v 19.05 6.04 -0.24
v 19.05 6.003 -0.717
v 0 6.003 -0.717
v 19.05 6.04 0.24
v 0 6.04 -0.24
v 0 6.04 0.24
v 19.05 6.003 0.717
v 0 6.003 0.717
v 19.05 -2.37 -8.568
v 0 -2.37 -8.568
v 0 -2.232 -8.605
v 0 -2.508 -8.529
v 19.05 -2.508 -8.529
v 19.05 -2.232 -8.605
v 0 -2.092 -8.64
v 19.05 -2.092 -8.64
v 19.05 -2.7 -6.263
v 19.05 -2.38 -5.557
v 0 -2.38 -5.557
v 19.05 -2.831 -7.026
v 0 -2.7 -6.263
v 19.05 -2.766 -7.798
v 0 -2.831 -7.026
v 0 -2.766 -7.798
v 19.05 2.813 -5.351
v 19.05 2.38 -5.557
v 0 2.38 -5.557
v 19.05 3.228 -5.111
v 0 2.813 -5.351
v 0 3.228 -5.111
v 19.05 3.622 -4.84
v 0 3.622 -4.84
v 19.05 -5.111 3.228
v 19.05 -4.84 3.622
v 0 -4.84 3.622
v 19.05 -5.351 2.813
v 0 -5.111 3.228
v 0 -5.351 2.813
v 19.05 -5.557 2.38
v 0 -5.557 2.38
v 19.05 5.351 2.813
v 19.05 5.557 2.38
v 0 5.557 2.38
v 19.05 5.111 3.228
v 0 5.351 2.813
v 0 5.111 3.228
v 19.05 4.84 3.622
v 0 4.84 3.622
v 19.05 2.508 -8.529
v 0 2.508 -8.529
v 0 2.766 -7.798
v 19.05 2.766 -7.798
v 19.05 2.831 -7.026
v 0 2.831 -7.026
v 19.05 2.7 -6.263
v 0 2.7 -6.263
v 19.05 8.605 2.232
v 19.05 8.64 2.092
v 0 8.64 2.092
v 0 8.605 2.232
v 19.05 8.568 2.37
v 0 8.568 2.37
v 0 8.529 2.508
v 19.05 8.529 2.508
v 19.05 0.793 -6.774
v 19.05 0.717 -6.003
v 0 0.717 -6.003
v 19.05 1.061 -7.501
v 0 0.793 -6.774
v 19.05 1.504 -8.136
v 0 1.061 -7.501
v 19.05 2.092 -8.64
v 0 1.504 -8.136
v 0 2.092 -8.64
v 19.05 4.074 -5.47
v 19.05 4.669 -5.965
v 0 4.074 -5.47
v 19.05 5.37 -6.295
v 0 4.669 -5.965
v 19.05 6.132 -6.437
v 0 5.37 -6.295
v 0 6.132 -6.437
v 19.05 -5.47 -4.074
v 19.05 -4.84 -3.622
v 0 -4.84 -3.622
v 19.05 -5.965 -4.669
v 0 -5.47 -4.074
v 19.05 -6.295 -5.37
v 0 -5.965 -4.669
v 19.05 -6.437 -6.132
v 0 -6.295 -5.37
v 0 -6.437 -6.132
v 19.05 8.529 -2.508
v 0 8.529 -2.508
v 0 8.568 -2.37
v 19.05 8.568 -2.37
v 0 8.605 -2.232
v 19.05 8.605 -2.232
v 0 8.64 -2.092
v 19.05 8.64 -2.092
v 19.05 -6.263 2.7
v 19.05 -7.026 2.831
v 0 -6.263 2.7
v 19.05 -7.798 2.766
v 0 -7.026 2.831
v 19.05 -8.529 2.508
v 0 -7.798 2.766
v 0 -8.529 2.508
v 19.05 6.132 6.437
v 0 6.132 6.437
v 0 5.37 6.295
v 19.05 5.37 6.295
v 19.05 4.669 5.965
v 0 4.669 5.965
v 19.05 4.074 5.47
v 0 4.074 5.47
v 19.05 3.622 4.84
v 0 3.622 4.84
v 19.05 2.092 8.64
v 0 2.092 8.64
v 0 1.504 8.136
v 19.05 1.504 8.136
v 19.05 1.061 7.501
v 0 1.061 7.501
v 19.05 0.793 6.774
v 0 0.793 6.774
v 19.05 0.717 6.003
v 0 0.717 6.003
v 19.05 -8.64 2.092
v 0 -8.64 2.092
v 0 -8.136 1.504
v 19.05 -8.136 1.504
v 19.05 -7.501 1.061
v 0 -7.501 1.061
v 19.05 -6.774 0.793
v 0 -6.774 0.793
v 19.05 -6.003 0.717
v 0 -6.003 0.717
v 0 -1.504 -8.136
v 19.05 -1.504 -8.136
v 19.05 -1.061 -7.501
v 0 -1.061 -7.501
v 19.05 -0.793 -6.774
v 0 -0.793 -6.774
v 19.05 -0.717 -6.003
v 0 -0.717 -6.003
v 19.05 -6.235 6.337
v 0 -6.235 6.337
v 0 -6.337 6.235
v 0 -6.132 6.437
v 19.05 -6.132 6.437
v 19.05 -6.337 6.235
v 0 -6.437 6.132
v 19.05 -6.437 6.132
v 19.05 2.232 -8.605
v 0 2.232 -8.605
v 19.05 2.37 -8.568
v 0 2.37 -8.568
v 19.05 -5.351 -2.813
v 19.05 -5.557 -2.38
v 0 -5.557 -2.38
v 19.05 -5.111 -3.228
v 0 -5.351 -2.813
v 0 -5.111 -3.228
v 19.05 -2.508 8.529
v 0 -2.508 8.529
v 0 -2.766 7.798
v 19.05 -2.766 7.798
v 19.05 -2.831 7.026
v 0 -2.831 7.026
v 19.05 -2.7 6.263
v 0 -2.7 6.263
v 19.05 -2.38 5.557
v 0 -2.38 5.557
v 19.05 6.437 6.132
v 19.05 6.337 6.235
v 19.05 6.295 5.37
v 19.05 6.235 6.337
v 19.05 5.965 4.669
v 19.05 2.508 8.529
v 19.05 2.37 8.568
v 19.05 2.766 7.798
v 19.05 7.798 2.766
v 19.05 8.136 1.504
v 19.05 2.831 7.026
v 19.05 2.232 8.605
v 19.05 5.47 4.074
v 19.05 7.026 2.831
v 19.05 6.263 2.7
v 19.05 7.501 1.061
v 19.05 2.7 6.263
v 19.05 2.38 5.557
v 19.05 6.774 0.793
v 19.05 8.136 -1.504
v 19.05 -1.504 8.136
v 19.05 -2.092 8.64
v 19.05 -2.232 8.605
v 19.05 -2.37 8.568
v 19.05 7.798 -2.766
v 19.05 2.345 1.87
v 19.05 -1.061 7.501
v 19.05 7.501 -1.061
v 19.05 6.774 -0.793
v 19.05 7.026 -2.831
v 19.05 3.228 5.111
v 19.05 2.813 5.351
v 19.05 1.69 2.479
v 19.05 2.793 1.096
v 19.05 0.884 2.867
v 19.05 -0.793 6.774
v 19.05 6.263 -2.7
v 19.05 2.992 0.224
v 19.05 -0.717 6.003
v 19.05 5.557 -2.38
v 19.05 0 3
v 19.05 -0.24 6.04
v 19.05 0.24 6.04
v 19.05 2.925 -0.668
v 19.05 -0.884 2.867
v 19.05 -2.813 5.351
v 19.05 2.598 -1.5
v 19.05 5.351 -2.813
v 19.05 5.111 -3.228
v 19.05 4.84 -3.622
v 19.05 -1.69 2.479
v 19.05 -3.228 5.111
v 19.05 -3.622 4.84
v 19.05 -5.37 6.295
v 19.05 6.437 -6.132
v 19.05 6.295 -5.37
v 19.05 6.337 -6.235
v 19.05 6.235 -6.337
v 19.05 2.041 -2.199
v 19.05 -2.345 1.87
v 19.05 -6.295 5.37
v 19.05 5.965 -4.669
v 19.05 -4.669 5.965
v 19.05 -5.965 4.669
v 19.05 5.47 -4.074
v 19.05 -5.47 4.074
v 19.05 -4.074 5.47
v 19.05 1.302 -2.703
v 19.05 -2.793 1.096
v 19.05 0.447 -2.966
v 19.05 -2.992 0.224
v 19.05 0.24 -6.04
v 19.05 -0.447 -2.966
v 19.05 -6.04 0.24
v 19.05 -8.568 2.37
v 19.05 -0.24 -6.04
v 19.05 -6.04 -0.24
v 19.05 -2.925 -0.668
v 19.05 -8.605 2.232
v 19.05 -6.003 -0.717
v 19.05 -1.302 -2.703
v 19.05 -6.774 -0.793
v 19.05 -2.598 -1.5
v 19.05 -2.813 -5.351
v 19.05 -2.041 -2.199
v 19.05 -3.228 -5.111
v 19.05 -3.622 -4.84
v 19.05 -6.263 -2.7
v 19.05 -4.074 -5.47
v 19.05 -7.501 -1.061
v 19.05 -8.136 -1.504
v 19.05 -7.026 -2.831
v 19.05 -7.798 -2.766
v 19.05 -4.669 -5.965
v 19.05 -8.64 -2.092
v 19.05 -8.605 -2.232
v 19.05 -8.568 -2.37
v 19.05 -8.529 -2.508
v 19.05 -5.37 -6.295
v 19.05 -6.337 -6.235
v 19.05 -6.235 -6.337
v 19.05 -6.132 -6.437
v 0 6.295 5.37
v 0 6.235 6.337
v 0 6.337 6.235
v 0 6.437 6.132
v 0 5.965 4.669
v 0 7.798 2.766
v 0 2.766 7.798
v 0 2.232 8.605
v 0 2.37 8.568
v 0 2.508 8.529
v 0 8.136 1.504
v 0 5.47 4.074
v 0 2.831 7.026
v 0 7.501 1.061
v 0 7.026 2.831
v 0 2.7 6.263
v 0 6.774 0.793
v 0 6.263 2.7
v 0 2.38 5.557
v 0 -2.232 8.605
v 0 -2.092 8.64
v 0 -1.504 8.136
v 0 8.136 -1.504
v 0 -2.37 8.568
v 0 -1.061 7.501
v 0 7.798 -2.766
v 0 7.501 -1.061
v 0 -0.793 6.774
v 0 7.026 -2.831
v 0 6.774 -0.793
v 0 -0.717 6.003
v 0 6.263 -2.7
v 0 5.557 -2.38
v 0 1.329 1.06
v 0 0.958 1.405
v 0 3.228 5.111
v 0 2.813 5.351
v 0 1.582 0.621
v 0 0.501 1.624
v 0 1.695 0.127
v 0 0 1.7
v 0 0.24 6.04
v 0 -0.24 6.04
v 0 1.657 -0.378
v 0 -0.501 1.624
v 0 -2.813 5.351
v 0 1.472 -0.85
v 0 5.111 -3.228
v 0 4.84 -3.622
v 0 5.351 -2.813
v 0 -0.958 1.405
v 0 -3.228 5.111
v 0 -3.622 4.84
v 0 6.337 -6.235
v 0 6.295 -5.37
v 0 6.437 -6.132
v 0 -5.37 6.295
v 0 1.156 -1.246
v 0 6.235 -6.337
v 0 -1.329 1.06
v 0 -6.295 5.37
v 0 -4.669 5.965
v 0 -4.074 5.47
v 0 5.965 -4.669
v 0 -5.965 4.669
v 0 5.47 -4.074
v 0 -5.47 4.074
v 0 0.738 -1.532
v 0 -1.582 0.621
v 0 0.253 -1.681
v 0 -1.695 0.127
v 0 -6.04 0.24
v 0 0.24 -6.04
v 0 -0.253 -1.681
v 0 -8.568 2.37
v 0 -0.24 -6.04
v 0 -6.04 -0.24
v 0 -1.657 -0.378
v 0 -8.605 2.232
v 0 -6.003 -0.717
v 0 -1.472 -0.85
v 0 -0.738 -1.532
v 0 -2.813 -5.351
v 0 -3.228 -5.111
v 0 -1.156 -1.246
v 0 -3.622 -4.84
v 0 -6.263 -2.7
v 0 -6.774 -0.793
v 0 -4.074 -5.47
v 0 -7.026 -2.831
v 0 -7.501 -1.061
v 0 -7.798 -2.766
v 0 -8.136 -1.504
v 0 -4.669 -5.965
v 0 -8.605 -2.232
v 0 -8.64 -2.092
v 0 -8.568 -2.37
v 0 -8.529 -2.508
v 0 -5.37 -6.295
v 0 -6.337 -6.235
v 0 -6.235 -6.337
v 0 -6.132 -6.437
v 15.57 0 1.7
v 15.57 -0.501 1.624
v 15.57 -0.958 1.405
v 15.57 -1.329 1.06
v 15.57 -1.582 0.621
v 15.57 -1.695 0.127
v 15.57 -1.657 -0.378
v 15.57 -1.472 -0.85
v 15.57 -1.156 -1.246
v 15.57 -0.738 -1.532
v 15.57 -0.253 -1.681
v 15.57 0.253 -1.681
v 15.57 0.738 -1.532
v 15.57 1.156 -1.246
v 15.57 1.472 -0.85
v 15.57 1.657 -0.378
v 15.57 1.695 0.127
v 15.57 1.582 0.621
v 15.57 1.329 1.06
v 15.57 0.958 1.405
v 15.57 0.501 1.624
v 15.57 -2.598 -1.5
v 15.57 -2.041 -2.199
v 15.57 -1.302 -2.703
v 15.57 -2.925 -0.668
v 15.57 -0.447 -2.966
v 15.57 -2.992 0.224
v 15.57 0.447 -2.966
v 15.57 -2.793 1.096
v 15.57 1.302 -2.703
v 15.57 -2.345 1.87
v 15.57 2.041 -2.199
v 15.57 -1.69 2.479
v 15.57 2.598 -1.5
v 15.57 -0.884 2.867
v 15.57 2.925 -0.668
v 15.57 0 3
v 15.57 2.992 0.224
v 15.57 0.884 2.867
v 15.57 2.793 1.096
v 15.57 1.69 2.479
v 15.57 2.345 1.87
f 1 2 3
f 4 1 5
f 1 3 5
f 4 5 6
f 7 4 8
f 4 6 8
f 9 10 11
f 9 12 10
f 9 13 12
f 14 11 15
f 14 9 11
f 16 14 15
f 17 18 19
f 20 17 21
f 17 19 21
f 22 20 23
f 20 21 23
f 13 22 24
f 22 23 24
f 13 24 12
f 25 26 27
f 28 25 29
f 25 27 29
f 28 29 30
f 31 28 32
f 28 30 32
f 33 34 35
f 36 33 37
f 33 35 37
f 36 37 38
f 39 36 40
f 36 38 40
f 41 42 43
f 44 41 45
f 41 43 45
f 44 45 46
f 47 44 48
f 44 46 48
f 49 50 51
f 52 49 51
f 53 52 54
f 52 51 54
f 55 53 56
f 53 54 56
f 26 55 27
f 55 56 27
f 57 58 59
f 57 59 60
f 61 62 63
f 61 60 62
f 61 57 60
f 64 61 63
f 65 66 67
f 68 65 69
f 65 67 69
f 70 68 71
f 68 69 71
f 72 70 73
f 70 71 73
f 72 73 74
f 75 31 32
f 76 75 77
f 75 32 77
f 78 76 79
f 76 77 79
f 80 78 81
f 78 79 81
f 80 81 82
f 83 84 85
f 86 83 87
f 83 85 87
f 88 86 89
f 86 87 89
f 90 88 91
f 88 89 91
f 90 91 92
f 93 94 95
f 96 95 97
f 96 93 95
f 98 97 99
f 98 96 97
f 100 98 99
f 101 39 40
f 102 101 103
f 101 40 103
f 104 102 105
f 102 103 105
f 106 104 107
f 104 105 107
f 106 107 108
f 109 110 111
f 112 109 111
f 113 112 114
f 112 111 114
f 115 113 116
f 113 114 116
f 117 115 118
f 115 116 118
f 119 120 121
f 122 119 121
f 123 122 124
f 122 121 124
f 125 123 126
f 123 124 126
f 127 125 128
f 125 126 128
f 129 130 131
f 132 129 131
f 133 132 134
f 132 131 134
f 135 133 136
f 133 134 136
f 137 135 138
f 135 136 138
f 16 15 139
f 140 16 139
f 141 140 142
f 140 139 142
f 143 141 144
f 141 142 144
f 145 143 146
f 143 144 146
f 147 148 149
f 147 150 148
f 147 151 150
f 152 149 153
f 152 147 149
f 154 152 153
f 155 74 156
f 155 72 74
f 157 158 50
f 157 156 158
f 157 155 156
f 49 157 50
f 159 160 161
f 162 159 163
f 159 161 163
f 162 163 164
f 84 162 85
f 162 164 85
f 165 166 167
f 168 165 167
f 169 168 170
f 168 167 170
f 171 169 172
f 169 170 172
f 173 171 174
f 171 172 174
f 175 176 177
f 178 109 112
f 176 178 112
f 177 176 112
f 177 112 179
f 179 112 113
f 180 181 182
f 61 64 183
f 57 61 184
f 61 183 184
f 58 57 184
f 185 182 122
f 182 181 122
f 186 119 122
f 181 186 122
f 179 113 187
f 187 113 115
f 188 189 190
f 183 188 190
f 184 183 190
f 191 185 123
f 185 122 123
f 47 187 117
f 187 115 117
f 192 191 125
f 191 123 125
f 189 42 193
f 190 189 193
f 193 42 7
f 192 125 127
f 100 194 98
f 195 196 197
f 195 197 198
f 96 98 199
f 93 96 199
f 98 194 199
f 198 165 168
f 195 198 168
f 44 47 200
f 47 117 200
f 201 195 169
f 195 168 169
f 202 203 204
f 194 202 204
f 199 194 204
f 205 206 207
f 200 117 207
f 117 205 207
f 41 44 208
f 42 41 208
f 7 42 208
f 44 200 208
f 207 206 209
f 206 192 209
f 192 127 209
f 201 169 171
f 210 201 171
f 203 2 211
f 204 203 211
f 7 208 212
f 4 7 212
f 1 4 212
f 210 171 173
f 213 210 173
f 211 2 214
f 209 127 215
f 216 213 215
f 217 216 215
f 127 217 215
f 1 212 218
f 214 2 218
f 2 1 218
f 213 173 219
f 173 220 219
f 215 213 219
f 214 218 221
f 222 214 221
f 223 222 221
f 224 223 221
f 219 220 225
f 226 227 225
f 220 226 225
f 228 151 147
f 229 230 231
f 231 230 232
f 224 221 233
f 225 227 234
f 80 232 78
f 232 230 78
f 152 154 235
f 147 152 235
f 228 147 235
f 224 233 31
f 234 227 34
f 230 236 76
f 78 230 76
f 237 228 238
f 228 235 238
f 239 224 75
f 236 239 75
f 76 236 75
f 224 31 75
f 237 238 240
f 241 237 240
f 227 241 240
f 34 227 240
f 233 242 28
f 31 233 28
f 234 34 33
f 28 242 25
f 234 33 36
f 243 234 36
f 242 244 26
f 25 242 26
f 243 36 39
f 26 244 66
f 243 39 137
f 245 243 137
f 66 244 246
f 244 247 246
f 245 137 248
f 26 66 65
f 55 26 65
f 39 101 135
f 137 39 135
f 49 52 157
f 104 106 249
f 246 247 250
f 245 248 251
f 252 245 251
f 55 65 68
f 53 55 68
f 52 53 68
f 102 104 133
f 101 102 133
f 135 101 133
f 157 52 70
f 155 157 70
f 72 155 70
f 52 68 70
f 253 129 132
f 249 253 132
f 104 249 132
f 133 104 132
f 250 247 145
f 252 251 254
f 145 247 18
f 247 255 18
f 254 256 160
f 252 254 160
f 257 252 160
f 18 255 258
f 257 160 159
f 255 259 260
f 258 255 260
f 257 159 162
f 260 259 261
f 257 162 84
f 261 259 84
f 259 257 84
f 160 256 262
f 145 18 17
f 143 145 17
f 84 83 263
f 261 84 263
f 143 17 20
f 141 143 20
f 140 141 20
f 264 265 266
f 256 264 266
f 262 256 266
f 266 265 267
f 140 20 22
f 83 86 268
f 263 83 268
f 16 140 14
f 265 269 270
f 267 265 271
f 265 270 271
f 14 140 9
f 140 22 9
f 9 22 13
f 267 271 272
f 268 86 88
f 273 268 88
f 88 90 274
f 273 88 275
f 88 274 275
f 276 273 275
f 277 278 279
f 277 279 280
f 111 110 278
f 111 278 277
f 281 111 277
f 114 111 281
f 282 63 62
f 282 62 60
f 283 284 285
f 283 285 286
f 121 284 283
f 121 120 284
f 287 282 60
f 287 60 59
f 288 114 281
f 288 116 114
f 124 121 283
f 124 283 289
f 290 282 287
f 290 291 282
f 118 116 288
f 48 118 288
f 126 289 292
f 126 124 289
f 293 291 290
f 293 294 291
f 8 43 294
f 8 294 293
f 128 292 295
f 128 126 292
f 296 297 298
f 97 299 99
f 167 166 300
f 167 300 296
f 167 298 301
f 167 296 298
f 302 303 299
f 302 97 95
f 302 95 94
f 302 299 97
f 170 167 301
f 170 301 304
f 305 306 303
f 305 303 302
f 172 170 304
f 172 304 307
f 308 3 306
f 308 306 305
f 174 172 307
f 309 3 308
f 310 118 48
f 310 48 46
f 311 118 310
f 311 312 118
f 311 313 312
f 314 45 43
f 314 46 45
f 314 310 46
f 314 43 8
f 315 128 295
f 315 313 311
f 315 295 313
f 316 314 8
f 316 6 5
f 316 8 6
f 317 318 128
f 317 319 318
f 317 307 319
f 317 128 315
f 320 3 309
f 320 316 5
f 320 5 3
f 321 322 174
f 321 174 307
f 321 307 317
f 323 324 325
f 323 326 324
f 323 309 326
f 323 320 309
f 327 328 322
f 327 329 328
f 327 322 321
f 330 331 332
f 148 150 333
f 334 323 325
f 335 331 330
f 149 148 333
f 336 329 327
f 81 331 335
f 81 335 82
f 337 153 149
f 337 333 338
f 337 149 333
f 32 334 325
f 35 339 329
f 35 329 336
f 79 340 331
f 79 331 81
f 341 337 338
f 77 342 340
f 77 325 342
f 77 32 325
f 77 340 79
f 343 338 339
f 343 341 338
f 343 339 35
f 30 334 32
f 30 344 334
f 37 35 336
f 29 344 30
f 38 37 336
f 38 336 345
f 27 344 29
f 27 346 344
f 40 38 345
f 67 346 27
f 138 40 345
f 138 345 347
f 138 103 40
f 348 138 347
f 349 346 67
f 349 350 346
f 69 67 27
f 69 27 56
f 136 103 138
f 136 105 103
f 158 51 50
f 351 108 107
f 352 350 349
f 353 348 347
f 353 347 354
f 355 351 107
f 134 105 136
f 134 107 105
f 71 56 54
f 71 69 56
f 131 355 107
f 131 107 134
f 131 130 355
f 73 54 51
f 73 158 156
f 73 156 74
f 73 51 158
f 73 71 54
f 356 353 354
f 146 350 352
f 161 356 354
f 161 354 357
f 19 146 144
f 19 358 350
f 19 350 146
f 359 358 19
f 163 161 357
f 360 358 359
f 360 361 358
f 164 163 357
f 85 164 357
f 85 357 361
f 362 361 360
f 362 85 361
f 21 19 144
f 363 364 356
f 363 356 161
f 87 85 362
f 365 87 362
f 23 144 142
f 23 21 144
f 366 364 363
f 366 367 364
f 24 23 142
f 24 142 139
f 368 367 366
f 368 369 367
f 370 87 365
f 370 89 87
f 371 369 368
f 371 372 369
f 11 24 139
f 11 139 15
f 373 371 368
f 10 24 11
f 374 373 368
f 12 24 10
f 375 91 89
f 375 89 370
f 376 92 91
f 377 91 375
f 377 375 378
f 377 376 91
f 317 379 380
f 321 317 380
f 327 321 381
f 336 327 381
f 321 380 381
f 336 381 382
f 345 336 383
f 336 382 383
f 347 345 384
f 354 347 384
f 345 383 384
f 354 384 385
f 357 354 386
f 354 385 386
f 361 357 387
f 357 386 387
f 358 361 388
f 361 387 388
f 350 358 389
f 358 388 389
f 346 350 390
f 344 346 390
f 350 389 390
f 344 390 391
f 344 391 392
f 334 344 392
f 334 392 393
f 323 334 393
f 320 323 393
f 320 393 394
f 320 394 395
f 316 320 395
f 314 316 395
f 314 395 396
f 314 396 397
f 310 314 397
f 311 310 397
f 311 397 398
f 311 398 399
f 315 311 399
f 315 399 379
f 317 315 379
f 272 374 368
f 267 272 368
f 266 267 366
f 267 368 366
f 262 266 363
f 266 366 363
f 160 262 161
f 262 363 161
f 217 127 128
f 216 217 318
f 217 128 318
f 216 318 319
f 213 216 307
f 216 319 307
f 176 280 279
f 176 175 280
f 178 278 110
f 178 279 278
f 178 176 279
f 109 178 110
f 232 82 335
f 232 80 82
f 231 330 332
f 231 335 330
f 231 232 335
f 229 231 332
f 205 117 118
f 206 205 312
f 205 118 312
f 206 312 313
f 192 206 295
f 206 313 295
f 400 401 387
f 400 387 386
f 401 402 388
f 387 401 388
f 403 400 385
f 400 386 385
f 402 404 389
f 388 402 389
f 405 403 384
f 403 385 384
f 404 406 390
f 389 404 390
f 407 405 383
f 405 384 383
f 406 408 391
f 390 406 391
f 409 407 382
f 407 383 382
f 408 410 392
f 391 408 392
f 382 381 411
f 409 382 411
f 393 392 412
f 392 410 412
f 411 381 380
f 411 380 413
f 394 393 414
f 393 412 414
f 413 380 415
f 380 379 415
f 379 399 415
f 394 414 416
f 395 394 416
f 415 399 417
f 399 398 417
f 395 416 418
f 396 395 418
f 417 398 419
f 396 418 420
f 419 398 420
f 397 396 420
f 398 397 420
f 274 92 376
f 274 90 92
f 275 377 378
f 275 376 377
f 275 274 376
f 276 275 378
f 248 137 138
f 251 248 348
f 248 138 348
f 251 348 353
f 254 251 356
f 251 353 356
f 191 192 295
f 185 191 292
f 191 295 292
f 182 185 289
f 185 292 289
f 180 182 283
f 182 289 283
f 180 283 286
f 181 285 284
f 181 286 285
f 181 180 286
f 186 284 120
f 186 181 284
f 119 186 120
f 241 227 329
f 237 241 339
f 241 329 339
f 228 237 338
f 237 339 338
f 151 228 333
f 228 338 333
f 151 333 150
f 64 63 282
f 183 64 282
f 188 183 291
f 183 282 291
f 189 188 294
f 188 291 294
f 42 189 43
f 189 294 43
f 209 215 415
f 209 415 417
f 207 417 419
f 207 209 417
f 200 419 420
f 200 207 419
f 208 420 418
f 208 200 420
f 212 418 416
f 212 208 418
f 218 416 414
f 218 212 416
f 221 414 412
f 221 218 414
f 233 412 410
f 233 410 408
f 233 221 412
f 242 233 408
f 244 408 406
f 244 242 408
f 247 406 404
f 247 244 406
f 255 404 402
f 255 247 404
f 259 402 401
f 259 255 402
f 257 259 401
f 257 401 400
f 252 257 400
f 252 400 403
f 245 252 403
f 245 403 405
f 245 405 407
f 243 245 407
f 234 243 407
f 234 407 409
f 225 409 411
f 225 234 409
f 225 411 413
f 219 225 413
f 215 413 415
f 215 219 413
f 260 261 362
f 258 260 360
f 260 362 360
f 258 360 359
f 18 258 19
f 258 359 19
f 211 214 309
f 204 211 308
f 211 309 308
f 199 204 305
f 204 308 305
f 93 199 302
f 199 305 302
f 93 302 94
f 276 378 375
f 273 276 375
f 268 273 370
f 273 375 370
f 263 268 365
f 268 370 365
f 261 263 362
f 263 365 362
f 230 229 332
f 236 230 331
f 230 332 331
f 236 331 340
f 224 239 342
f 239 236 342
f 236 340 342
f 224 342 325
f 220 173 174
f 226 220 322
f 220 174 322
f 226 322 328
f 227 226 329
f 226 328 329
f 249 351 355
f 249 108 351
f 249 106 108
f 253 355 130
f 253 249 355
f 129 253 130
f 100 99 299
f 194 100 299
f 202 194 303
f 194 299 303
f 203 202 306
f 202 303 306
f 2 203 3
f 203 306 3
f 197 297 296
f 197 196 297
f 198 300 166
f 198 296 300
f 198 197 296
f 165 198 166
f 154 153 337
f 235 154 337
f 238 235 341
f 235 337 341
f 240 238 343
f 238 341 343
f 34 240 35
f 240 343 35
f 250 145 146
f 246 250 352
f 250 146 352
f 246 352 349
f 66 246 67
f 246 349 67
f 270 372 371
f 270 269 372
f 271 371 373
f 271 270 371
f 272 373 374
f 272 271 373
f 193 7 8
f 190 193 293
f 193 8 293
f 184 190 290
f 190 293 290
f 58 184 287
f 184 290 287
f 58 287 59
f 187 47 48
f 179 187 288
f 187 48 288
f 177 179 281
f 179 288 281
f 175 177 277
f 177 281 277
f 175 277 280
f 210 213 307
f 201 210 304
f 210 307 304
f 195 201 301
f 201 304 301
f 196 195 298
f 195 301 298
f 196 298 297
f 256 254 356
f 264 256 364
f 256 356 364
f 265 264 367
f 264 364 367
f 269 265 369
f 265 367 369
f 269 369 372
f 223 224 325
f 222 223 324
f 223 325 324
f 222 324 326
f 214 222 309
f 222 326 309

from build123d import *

# Parameters (mm, degrees)
BASPROSKE_W          = 19.05
BASPROSKE_H          = 8.89
TOOTHCUT_DEPTH       = 23.82469496
TEETHCUTS_COUNT      = 12
TEETHCUTS_ANGLE      = 330
BORSKE_R             = 1.5875
BORE_DEPTH           = 50.8015748
CUT_EXTRUDE1_START   = -19.05
SKETCH1_R            = 3
CUT_EXTRUDE1_DEPTH   = 3.4798
M3_CLEARANCE_HOLE1_D = 3.4


with BuildPart() as part:
    # BasProSke → Base-Revolve (revolve)
    with BuildSketch(Plane(origin=(0, 0, 0), x_dir=(1, 0, 0), z_dir=(0, 1, 0)), mode=Mode.PRIVATE) as base_revolve_sk:
        with Locations((9.525, 4.445)):
            Rectangle(BASPROSKE_W, BASPROSKE_H)
    revolve(base_revolve_sk.sketch.rotate(Axis((-10, 0, 0), (1, 0, 0)), 180), axis=Axis((-10, 0, 0), (1, 0, 0)))

    # TooCutSke → ToothCut (cut, through all)
    with BuildSketch(Plane(origin=(0, 0, 0), x_dir=(0, 0, -1), z_dir=(1, 0, 0))):
        with BuildLine():
            ThreePointArc((0.717076553, 6.002519826), (0, 6.0452), (-0.717076553, 6.002519826))
            ThreePointArc((-0.717076553, 6.002519826), (-1.069160545, 7.516029346), (-2.121611652, 8.659279483))
            ThreePointArc((-2.121611652, 8.659279483), (0, 8.9154), (2.121611652, 8.659279483))
            ThreePointArc((2.121611652, 8.659279483), (1.069160545, 7.516029346), (0.717076553, 6.002519826))
        make_face()
    toothcut = extrude(amount=TOOTHCUT_DEPTH, mode=Mode.SUBTRACT)

    # TeethCuts: ToothCut ×12 about axis
    teethcuts_axis = Axis((-10, 0, 0), (1, 0, 0))
    for i in range(1, TEETHCUTS_COUNT):
        add(toothcut.rotate(teethcuts_axis, i * TEETHCUTS_ANGLE / (TEETHCUTS_COUNT - 1)), mode=Mode.SUBTRACT)

    # BorSke → Bore (cut, symmetric)
    with BuildSketch(Plane(origin=(0, 0, 0), x_dir=(0, 0, -1), z_dir=(1, 0, 0))):
        with Locations(Location((0, 0, 0), (0, 0, 180))):
            Circle(BORSKE_R)
    extrude(amount=BORE_DEPTH, both=True, mode=Mode.SUBTRACT)

    # Sketch1 → Cut-Extrude1 (cut)
    with BuildSketch(Plane.ZY.offset(CUT_EXTRUDE1_START)):
        Circle(SKETCH1_R)
    extrude(amount=CUT_EXTRUDE1_DEPTH, mode=Mode.SUBTRACT)

    # M3 Clearance Hole1 (through all)
    with Locations(Plane(origin=(0, 0, 0), x_dir=(0, 0, -1), z_dir=(-1, 0, 0))):
        with Locations((0, 0)):
            Hole(M3_CLEARANCE_HOLE1_D / 2)


solid = part.part
